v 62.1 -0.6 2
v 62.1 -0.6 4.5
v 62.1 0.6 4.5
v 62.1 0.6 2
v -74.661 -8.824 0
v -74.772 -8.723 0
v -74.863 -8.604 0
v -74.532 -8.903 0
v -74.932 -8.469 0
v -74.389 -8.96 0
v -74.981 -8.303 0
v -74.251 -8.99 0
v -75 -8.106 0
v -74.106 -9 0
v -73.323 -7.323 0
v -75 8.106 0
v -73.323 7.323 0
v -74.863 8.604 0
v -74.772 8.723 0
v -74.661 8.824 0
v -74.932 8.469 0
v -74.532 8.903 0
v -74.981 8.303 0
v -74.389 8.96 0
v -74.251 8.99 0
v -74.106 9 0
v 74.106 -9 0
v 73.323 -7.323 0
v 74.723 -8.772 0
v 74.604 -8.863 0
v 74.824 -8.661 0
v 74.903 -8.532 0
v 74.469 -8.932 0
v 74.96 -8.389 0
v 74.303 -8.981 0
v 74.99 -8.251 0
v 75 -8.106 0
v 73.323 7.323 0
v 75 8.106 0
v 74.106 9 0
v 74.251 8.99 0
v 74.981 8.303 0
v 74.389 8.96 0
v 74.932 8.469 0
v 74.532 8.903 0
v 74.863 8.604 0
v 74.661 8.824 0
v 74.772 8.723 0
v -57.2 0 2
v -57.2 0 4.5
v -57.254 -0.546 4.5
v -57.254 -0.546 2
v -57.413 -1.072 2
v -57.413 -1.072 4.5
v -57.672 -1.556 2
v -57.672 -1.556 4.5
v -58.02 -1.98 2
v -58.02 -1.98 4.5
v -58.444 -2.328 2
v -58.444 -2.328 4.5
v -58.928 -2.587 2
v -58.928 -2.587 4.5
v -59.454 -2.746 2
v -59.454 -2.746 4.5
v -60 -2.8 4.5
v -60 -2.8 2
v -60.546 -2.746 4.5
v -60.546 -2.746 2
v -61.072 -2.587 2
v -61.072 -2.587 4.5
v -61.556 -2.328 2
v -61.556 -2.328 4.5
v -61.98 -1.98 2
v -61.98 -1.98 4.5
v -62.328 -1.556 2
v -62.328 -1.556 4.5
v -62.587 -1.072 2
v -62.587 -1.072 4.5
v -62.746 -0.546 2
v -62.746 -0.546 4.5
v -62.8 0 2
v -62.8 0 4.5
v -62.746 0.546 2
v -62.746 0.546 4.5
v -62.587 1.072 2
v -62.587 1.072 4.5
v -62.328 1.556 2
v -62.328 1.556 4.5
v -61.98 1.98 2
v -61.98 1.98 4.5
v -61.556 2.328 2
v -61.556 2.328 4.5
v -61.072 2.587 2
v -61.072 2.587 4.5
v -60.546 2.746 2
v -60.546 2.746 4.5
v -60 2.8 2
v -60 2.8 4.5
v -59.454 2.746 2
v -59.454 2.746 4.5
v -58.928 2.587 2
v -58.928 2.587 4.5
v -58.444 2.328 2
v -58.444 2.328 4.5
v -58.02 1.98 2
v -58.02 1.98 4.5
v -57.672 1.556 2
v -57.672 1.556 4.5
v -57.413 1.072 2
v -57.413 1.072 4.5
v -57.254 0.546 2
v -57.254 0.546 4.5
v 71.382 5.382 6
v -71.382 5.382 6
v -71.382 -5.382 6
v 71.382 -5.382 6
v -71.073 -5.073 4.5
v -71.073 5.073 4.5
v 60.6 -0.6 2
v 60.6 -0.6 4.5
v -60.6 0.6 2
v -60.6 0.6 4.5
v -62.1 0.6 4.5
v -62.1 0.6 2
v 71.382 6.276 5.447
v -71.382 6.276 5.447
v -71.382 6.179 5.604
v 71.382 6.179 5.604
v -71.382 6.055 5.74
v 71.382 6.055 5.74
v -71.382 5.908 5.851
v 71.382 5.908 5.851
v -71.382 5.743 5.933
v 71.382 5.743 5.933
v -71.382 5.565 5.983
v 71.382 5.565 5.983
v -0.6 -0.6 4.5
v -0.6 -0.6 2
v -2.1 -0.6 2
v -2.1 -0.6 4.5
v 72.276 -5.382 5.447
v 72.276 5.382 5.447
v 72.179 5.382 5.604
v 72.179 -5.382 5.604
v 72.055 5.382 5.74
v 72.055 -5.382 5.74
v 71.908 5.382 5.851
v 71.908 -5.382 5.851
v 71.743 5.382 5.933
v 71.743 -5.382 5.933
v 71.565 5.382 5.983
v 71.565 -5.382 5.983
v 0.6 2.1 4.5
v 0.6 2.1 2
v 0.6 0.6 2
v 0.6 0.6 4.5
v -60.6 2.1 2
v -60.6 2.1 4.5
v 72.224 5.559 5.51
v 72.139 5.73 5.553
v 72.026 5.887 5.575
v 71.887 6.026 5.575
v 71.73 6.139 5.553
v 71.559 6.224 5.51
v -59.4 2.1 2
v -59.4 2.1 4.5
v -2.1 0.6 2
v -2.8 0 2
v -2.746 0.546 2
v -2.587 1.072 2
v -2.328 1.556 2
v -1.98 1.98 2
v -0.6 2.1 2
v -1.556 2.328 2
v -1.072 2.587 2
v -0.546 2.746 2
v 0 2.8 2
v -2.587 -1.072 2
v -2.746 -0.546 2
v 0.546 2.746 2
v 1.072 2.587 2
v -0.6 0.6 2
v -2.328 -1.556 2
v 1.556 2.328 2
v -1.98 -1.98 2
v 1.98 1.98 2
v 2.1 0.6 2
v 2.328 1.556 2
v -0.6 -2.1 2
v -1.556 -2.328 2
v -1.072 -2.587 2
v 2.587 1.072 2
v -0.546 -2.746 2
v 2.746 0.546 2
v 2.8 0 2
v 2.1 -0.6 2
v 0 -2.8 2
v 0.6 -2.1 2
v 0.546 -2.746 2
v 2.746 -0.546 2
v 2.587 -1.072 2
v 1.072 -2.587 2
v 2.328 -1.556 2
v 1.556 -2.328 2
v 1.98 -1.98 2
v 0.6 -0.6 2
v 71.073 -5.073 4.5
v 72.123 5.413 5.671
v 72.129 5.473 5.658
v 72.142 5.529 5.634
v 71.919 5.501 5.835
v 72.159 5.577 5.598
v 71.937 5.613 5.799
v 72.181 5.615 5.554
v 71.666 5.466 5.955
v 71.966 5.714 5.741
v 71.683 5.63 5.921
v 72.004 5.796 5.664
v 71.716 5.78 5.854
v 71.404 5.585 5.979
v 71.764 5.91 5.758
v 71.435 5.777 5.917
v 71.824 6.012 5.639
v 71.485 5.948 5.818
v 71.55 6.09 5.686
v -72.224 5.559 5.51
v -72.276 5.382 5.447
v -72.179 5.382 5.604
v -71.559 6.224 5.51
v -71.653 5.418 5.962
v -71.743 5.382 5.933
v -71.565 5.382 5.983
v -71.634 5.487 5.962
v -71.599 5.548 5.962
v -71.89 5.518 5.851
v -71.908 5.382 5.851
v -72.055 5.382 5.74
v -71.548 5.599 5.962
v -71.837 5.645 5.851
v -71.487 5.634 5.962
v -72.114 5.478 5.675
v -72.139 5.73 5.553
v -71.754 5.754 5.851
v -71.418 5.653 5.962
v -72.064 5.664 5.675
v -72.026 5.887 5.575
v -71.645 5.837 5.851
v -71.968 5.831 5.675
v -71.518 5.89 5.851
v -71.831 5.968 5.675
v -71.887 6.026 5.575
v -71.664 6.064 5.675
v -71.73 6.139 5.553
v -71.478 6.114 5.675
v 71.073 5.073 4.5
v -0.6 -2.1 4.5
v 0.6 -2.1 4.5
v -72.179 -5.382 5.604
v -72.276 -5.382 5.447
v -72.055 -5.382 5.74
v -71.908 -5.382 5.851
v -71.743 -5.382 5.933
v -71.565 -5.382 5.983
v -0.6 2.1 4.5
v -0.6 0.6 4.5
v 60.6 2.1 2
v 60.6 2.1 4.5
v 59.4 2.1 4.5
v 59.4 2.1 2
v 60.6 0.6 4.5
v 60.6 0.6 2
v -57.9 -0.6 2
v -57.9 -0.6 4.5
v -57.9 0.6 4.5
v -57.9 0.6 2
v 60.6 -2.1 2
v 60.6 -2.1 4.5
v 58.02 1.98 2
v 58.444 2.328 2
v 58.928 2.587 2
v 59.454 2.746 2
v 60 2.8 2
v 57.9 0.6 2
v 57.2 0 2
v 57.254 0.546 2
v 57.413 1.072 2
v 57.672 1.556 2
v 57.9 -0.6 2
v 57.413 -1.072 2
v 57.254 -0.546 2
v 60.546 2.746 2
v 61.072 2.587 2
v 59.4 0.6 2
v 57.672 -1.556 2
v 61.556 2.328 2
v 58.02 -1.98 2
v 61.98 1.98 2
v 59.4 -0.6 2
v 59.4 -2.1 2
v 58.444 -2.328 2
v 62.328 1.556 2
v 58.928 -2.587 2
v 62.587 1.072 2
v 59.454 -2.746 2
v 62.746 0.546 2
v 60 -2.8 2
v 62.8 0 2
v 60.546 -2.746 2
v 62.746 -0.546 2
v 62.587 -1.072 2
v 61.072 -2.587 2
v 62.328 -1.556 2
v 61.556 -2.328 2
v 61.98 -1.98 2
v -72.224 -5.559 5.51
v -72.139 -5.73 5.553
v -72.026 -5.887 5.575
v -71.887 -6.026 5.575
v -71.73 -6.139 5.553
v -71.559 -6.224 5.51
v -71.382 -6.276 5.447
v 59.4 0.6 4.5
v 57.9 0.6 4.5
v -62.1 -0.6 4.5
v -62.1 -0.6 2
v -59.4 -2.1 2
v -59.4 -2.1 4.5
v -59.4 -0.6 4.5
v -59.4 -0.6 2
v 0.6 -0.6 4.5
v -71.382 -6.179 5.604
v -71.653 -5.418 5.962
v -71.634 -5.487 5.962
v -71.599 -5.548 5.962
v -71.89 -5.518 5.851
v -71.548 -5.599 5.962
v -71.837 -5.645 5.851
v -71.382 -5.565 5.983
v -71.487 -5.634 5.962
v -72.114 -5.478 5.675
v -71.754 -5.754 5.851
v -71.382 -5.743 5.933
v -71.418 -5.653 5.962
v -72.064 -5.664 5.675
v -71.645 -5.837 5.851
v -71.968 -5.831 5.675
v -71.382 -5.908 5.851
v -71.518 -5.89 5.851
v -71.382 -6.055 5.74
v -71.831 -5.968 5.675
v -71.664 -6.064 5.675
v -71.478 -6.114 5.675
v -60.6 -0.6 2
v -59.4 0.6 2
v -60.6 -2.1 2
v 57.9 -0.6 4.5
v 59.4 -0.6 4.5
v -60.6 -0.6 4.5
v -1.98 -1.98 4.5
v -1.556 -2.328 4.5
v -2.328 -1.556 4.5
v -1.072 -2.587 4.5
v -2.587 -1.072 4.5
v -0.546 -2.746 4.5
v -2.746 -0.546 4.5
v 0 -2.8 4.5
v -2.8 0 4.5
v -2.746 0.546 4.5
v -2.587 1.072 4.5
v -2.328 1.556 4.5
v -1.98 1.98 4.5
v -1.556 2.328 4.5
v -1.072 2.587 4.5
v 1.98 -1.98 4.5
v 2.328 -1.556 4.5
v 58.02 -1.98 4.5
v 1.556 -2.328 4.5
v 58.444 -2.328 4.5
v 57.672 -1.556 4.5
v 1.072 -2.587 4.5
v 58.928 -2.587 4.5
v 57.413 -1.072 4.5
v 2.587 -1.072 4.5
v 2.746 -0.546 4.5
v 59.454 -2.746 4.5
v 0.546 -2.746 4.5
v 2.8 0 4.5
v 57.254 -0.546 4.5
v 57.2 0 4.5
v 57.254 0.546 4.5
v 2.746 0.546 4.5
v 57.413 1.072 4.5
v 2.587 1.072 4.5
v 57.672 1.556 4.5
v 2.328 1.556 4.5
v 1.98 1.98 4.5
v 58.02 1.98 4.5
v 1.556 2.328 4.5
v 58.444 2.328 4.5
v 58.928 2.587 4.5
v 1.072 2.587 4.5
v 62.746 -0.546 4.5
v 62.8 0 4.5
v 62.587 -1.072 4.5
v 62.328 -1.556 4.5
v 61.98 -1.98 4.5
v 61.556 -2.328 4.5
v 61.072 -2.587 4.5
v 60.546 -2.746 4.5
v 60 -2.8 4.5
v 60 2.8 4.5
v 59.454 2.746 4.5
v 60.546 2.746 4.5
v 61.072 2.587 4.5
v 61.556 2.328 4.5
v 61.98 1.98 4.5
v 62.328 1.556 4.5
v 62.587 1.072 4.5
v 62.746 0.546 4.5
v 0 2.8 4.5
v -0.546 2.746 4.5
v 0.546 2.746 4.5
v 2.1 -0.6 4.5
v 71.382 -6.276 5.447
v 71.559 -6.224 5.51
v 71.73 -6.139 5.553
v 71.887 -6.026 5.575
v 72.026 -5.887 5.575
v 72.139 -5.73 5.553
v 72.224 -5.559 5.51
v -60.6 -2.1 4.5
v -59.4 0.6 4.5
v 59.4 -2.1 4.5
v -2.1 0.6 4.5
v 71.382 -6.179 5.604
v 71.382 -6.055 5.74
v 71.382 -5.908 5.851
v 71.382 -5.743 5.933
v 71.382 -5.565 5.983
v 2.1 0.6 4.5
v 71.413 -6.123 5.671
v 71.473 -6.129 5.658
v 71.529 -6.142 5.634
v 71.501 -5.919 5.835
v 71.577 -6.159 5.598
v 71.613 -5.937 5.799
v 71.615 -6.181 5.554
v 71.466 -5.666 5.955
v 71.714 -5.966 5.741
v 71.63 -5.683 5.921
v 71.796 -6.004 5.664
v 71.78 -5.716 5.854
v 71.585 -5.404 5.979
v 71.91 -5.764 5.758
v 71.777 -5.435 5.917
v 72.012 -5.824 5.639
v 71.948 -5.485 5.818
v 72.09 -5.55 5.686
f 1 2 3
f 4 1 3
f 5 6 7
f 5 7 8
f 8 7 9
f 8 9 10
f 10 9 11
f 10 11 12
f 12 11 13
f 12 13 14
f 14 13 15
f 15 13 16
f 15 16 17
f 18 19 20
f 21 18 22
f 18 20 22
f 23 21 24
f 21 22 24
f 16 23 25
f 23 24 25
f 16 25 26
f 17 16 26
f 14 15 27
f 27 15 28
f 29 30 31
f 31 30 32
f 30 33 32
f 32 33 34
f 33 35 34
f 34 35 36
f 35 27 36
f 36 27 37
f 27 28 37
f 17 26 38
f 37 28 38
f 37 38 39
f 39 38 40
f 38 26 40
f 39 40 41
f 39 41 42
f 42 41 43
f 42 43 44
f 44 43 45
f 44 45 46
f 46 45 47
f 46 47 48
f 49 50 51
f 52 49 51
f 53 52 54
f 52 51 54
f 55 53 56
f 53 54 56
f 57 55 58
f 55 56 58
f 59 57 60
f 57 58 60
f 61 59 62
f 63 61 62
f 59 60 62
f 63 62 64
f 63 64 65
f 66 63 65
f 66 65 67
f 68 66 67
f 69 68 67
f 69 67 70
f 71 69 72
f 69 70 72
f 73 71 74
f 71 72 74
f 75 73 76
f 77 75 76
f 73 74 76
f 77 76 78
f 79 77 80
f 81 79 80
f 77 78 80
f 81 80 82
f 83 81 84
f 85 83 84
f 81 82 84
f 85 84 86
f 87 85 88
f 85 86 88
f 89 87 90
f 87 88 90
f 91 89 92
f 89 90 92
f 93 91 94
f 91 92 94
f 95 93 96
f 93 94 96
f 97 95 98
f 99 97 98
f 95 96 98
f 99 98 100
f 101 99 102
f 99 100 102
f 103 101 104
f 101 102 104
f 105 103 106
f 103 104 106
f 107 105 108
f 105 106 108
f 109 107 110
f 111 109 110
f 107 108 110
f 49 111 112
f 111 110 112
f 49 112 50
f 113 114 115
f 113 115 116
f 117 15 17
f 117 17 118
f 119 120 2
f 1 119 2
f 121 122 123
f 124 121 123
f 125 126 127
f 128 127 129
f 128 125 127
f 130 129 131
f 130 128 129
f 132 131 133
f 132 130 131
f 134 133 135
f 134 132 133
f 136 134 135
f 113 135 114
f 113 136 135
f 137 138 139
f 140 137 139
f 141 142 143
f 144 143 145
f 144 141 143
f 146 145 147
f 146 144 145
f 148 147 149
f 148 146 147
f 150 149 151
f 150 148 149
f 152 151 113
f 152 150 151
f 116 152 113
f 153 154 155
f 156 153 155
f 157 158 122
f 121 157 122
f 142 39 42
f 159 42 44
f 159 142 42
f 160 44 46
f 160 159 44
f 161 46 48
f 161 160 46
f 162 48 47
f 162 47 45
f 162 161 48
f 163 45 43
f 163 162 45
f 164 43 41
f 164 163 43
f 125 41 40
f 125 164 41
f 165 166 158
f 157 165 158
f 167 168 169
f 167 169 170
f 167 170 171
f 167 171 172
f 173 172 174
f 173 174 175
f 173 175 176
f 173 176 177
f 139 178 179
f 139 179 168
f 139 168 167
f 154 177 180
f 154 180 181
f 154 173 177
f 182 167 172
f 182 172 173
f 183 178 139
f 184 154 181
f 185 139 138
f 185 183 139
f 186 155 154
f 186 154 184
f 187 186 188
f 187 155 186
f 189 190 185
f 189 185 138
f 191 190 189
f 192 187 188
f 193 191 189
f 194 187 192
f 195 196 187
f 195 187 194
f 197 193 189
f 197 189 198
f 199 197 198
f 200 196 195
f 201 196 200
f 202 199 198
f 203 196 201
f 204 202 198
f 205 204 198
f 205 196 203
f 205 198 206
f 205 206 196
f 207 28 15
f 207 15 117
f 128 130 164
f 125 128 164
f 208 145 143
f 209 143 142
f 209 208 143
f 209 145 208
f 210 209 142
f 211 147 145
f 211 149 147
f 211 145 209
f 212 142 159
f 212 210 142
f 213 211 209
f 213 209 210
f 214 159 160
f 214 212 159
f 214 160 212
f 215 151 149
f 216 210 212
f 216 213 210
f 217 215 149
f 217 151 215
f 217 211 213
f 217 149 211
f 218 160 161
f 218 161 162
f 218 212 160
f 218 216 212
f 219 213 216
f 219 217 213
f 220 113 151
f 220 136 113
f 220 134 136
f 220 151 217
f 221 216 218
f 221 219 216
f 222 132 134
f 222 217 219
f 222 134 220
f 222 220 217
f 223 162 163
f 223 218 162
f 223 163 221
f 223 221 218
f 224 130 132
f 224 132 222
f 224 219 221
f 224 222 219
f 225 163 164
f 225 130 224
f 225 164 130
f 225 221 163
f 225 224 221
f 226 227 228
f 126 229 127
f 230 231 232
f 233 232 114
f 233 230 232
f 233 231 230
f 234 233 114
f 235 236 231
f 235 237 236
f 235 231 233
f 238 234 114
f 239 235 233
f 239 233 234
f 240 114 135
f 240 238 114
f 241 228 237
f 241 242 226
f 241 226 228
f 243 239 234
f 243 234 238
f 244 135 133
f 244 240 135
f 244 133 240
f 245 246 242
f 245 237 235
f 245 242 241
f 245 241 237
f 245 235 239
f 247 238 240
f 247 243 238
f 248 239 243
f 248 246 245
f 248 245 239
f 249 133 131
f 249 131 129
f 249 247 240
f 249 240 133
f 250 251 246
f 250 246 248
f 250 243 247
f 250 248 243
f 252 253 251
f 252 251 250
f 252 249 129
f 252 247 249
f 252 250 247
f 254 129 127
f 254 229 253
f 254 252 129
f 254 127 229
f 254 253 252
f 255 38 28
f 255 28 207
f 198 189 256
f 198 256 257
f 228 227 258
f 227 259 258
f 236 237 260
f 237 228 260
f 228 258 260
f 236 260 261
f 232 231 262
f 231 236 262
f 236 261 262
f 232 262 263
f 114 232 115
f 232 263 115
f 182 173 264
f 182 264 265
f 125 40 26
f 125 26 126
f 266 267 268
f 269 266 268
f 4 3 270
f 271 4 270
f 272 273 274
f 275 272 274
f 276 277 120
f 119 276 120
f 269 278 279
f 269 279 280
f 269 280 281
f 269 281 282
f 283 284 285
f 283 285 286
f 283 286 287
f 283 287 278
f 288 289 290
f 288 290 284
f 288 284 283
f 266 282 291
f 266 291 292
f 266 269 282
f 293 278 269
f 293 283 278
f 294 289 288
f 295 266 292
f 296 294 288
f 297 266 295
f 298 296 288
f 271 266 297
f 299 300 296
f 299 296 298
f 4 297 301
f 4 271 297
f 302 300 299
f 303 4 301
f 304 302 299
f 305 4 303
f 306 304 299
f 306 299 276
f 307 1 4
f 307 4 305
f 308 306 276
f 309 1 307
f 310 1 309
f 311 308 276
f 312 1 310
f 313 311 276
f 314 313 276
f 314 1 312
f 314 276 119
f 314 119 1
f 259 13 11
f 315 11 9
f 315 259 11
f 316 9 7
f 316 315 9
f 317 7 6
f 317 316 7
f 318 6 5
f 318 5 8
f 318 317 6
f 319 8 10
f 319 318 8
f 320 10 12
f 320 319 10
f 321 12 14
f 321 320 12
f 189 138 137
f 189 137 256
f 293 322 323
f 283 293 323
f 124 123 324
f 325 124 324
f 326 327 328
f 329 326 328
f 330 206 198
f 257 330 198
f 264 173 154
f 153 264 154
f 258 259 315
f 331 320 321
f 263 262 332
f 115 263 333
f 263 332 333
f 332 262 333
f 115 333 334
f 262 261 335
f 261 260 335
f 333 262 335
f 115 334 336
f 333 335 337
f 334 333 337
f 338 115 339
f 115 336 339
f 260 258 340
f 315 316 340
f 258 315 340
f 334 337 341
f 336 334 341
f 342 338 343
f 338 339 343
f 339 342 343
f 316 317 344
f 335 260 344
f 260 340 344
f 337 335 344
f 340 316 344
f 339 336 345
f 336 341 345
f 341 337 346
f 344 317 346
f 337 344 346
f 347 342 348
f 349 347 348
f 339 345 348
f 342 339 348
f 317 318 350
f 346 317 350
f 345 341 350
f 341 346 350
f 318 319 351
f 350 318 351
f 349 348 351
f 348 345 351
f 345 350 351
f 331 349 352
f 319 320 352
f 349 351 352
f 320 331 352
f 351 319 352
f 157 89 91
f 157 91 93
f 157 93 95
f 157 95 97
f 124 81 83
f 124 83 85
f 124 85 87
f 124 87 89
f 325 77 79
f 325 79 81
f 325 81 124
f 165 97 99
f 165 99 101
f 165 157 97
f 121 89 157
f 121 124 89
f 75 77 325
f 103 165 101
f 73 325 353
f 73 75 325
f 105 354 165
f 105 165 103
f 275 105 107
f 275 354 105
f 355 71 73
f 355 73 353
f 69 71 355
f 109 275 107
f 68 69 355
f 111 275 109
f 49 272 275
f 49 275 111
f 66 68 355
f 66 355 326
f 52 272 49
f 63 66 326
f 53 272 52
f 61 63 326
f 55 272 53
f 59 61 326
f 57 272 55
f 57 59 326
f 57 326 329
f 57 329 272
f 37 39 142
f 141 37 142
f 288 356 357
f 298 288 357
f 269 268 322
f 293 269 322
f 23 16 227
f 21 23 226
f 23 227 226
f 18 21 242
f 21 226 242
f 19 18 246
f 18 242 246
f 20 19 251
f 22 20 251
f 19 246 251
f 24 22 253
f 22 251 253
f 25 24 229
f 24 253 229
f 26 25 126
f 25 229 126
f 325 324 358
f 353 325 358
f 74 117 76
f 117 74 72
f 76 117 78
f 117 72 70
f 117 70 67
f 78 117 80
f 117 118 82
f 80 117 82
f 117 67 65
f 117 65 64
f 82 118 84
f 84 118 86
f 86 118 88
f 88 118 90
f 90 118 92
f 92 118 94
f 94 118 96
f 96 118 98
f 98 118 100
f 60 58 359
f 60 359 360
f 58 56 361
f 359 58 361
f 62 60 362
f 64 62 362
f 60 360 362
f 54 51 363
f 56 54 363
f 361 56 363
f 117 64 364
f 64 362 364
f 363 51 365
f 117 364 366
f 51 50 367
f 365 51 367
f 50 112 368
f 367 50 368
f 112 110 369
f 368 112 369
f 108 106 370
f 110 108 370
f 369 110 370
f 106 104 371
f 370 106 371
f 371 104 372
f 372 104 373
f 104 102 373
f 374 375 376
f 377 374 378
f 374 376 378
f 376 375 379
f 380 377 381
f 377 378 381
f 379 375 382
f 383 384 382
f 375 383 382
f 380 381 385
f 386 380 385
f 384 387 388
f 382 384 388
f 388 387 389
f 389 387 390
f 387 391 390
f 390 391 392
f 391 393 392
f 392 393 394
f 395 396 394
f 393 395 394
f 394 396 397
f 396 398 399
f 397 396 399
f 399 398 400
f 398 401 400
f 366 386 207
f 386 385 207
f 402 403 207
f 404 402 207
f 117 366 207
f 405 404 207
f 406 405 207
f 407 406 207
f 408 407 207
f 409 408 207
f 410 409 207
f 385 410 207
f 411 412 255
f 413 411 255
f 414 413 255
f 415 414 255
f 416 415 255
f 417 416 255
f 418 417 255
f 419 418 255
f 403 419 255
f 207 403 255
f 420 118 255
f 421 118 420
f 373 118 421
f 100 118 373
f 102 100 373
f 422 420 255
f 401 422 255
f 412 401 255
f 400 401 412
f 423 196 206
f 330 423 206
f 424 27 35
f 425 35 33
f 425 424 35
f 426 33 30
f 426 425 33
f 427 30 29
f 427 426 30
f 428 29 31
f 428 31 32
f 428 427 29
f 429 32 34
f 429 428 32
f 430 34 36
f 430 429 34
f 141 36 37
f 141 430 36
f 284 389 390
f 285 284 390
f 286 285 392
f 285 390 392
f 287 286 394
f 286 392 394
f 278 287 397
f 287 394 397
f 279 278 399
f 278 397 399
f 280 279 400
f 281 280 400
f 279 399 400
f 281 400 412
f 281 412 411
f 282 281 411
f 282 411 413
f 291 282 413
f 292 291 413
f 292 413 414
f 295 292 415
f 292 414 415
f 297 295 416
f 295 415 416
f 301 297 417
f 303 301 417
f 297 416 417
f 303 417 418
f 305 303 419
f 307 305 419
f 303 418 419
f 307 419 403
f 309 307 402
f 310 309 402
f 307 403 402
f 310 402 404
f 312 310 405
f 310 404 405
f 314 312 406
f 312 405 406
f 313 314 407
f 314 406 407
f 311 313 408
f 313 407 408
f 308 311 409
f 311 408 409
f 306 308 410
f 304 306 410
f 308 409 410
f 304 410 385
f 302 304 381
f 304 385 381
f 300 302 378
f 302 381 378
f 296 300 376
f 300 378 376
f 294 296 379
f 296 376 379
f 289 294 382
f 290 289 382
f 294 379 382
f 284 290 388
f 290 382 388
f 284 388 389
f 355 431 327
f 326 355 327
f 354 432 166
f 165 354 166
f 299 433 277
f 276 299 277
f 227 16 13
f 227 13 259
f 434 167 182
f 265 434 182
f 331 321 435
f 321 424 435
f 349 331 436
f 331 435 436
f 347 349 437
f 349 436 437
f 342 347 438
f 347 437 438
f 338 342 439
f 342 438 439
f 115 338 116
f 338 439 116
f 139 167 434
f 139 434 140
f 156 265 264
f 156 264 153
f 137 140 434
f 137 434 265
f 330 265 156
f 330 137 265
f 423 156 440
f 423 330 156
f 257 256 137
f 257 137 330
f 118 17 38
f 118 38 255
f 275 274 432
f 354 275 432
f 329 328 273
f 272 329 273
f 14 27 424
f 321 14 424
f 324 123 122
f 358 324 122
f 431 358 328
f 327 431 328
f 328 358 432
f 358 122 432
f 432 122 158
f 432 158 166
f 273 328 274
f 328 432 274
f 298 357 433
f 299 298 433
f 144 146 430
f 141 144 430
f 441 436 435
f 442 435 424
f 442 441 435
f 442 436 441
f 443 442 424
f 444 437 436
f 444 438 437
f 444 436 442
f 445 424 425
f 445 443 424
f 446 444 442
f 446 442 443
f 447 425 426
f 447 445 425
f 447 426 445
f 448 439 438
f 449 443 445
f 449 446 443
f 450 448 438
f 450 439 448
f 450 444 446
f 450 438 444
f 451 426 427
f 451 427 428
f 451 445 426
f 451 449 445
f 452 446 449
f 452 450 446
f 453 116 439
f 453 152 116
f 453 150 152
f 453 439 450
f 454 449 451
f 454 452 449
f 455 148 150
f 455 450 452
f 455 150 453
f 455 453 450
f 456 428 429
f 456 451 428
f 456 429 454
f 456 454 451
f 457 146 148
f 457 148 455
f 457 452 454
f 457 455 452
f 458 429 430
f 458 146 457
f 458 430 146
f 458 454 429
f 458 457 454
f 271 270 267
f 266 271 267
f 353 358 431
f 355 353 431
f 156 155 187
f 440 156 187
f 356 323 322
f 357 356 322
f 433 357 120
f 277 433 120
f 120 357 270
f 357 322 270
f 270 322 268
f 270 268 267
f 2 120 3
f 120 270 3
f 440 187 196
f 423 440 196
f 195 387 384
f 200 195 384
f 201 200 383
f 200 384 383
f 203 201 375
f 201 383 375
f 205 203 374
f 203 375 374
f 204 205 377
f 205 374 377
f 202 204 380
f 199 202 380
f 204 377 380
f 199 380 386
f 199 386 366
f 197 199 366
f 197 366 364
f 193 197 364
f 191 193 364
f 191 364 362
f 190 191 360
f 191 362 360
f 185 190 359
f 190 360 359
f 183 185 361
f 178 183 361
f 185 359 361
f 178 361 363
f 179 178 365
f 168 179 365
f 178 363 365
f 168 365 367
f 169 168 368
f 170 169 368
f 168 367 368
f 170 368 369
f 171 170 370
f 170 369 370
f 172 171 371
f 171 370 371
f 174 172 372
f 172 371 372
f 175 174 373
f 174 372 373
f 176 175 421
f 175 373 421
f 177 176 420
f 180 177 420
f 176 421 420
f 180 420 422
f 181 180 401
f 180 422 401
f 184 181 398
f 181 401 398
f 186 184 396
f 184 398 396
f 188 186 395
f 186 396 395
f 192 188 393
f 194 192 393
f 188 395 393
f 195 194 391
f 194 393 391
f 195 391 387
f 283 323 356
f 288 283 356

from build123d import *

# Parameters (mm, degrees)
F0_W        = 150
F0_H        = 18
F1_DEPTH    = 6
F2_T1_DEPTH = 49.0779464854
F2_T3_DEPTH = 181.0779464854
F3_R        = 1
F4_T        = -1.5
F5_R        = 2.8
F6_DEPTH    = 2.5
F7_W        = 1.5
F7_H        = 1.2
F7_W_2      = 1.2
F7_H_2      = 1.5
F8_DEPTH    = 2.5
F9_R        = 2.8
F10_DEPTH   = 2.5


# Not quite as in the source:
# - a fillet or chamfer that OpenCascade refuses, or shapes differently, is made with other operations: its cross-section is extruded or revolved along the edge and cut away or added


with BuildPart() as f1:
    # F0 (on Top) → F1 (new body)
    with BuildSketch(Plane.XY):
        Rectangle(F0_W, F0_H)
    extrude(amount=F1_DEPTH)

    # F2: chamfer of 3 x 6 on 4 edges, made by hand

    # F2_s2 → F2_t1 (cut)
    with BuildSketch(Plane.XZ.offset(-24.5389732427)):
        Polygon((75, 0), (72, 6), (75, 6), align=None)
        Polygon((-75, 0), (-72, 6), (-75, 6), align=None)
    extrude(amount=F2_T1_DEPTH, mode=Mode.SUBTRACT)

    # F2_s4 → F2_t3 (cut)
    with BuildSketch(Plane.YZ.offset(-90.5389732427)):
        Polygon((9, 0), (6, 6), (9, 6), align=None)
        Polygon((-9, 0), (-6, 6), (-9, 6), align=None)
    extrude(amount=F2_T3_DEPTH, mode=Mode.SUBTRACT)

    # F3
    f3_edges = [f1.edges().sort_by_distance(p)[0] for p in [
        (-73.5, 7.5, 3),
        (-73.5, -7.5, 3),
        (-72, 0, 6),
        (0, 6, 6),
        (72, 0, 6),
        (0, -6, 6),
        (73.5, 7.5, 3),
        (73.5, -7.5, 3),
    ]]
    fillet(f3_edges, radius=F3_R)

    # F4
    f4_openings = [f1.faces().sort_by_distance(p)[0] for p in [
        (0, 0, 0),
    ]]
    offset(amount=F4_T, openings=f4_openings)

    # F5 (on face) → F6 (join)
    with BuildSketch(Plane(origin=(0, 0, 4.5), x_dir=(1, 0, 0), z_dir=(0, 0, -1))):
        Circle(F5_R)
    extrude(amount=F6_DEPTH)

    # F7 (on face) → F8 (cut)
    with BuildSketch(Plane(origin=(0, 0, 2), x_dir=(1, 0, 0), z_dir=(0, 0, -1))):
        with Locations((-1.35, 0)):
            Rectangle(F7_W, F7_H)
        Rectangle(F7_W_2, F7_H)
        with Locations((0, -1.35)):
            Rectangle(F7_W_2, F7_H_2)
        with Locations((1.35, 0)):
            Rectangle(F7_W, F7_H)
        with Locations((0, 1.35)):
            Rectangle(F7_W_2, F7_H_2)
    extrude(amount=-F8_DEPTH, mode=Mode.SUBTRACT)

    # F9 (on face) → F10 (join)
    with BuildSketch(Plane(origin=(0, 0, 4.5), x_dir=(1, 0, 0), z_dir=(0, 0, -1))):
        with BuildLine():
            ThreePointArc((62.8, 0), (60, 2.8), (57.2, 0))
            ThreePointArc((57.2, 0), (60, -2.8), (62.8, 0))
        make_face()
        Polygon((57.9, -0.6), (57.9, 0), (57.9, 0.6), (59.4, 0.6), (59.4, 2.1), (60.6, 2.1), (60.6, 0.6), (62.1, 0.6), (62.1, -0.6), (60.6, -0.6), (60.6, -2.1), (59.4, -2.1), (59.4, -0.6), align=None, mode=Mode.SUBTRACT)
        with Locations((-60, 0)):
            Circle(F9_R)
        Polygon((-59.4, -0.6), (-59.4, -2.1), (-60.6, -2.1), (-60.6, -0.6), (-62.1, -0.6), (-62.1, 0.6), (-60.6, 0.6), (-60.6, 2.1), (-59.4, 2.1), (-59.4, 0.6), (-57.9, 0.6), (-57.9, -0.6), align=None, mode=Mode.SUBTRACT)
    extrude(amount=F10_DEPTH)


solid = f1.part
